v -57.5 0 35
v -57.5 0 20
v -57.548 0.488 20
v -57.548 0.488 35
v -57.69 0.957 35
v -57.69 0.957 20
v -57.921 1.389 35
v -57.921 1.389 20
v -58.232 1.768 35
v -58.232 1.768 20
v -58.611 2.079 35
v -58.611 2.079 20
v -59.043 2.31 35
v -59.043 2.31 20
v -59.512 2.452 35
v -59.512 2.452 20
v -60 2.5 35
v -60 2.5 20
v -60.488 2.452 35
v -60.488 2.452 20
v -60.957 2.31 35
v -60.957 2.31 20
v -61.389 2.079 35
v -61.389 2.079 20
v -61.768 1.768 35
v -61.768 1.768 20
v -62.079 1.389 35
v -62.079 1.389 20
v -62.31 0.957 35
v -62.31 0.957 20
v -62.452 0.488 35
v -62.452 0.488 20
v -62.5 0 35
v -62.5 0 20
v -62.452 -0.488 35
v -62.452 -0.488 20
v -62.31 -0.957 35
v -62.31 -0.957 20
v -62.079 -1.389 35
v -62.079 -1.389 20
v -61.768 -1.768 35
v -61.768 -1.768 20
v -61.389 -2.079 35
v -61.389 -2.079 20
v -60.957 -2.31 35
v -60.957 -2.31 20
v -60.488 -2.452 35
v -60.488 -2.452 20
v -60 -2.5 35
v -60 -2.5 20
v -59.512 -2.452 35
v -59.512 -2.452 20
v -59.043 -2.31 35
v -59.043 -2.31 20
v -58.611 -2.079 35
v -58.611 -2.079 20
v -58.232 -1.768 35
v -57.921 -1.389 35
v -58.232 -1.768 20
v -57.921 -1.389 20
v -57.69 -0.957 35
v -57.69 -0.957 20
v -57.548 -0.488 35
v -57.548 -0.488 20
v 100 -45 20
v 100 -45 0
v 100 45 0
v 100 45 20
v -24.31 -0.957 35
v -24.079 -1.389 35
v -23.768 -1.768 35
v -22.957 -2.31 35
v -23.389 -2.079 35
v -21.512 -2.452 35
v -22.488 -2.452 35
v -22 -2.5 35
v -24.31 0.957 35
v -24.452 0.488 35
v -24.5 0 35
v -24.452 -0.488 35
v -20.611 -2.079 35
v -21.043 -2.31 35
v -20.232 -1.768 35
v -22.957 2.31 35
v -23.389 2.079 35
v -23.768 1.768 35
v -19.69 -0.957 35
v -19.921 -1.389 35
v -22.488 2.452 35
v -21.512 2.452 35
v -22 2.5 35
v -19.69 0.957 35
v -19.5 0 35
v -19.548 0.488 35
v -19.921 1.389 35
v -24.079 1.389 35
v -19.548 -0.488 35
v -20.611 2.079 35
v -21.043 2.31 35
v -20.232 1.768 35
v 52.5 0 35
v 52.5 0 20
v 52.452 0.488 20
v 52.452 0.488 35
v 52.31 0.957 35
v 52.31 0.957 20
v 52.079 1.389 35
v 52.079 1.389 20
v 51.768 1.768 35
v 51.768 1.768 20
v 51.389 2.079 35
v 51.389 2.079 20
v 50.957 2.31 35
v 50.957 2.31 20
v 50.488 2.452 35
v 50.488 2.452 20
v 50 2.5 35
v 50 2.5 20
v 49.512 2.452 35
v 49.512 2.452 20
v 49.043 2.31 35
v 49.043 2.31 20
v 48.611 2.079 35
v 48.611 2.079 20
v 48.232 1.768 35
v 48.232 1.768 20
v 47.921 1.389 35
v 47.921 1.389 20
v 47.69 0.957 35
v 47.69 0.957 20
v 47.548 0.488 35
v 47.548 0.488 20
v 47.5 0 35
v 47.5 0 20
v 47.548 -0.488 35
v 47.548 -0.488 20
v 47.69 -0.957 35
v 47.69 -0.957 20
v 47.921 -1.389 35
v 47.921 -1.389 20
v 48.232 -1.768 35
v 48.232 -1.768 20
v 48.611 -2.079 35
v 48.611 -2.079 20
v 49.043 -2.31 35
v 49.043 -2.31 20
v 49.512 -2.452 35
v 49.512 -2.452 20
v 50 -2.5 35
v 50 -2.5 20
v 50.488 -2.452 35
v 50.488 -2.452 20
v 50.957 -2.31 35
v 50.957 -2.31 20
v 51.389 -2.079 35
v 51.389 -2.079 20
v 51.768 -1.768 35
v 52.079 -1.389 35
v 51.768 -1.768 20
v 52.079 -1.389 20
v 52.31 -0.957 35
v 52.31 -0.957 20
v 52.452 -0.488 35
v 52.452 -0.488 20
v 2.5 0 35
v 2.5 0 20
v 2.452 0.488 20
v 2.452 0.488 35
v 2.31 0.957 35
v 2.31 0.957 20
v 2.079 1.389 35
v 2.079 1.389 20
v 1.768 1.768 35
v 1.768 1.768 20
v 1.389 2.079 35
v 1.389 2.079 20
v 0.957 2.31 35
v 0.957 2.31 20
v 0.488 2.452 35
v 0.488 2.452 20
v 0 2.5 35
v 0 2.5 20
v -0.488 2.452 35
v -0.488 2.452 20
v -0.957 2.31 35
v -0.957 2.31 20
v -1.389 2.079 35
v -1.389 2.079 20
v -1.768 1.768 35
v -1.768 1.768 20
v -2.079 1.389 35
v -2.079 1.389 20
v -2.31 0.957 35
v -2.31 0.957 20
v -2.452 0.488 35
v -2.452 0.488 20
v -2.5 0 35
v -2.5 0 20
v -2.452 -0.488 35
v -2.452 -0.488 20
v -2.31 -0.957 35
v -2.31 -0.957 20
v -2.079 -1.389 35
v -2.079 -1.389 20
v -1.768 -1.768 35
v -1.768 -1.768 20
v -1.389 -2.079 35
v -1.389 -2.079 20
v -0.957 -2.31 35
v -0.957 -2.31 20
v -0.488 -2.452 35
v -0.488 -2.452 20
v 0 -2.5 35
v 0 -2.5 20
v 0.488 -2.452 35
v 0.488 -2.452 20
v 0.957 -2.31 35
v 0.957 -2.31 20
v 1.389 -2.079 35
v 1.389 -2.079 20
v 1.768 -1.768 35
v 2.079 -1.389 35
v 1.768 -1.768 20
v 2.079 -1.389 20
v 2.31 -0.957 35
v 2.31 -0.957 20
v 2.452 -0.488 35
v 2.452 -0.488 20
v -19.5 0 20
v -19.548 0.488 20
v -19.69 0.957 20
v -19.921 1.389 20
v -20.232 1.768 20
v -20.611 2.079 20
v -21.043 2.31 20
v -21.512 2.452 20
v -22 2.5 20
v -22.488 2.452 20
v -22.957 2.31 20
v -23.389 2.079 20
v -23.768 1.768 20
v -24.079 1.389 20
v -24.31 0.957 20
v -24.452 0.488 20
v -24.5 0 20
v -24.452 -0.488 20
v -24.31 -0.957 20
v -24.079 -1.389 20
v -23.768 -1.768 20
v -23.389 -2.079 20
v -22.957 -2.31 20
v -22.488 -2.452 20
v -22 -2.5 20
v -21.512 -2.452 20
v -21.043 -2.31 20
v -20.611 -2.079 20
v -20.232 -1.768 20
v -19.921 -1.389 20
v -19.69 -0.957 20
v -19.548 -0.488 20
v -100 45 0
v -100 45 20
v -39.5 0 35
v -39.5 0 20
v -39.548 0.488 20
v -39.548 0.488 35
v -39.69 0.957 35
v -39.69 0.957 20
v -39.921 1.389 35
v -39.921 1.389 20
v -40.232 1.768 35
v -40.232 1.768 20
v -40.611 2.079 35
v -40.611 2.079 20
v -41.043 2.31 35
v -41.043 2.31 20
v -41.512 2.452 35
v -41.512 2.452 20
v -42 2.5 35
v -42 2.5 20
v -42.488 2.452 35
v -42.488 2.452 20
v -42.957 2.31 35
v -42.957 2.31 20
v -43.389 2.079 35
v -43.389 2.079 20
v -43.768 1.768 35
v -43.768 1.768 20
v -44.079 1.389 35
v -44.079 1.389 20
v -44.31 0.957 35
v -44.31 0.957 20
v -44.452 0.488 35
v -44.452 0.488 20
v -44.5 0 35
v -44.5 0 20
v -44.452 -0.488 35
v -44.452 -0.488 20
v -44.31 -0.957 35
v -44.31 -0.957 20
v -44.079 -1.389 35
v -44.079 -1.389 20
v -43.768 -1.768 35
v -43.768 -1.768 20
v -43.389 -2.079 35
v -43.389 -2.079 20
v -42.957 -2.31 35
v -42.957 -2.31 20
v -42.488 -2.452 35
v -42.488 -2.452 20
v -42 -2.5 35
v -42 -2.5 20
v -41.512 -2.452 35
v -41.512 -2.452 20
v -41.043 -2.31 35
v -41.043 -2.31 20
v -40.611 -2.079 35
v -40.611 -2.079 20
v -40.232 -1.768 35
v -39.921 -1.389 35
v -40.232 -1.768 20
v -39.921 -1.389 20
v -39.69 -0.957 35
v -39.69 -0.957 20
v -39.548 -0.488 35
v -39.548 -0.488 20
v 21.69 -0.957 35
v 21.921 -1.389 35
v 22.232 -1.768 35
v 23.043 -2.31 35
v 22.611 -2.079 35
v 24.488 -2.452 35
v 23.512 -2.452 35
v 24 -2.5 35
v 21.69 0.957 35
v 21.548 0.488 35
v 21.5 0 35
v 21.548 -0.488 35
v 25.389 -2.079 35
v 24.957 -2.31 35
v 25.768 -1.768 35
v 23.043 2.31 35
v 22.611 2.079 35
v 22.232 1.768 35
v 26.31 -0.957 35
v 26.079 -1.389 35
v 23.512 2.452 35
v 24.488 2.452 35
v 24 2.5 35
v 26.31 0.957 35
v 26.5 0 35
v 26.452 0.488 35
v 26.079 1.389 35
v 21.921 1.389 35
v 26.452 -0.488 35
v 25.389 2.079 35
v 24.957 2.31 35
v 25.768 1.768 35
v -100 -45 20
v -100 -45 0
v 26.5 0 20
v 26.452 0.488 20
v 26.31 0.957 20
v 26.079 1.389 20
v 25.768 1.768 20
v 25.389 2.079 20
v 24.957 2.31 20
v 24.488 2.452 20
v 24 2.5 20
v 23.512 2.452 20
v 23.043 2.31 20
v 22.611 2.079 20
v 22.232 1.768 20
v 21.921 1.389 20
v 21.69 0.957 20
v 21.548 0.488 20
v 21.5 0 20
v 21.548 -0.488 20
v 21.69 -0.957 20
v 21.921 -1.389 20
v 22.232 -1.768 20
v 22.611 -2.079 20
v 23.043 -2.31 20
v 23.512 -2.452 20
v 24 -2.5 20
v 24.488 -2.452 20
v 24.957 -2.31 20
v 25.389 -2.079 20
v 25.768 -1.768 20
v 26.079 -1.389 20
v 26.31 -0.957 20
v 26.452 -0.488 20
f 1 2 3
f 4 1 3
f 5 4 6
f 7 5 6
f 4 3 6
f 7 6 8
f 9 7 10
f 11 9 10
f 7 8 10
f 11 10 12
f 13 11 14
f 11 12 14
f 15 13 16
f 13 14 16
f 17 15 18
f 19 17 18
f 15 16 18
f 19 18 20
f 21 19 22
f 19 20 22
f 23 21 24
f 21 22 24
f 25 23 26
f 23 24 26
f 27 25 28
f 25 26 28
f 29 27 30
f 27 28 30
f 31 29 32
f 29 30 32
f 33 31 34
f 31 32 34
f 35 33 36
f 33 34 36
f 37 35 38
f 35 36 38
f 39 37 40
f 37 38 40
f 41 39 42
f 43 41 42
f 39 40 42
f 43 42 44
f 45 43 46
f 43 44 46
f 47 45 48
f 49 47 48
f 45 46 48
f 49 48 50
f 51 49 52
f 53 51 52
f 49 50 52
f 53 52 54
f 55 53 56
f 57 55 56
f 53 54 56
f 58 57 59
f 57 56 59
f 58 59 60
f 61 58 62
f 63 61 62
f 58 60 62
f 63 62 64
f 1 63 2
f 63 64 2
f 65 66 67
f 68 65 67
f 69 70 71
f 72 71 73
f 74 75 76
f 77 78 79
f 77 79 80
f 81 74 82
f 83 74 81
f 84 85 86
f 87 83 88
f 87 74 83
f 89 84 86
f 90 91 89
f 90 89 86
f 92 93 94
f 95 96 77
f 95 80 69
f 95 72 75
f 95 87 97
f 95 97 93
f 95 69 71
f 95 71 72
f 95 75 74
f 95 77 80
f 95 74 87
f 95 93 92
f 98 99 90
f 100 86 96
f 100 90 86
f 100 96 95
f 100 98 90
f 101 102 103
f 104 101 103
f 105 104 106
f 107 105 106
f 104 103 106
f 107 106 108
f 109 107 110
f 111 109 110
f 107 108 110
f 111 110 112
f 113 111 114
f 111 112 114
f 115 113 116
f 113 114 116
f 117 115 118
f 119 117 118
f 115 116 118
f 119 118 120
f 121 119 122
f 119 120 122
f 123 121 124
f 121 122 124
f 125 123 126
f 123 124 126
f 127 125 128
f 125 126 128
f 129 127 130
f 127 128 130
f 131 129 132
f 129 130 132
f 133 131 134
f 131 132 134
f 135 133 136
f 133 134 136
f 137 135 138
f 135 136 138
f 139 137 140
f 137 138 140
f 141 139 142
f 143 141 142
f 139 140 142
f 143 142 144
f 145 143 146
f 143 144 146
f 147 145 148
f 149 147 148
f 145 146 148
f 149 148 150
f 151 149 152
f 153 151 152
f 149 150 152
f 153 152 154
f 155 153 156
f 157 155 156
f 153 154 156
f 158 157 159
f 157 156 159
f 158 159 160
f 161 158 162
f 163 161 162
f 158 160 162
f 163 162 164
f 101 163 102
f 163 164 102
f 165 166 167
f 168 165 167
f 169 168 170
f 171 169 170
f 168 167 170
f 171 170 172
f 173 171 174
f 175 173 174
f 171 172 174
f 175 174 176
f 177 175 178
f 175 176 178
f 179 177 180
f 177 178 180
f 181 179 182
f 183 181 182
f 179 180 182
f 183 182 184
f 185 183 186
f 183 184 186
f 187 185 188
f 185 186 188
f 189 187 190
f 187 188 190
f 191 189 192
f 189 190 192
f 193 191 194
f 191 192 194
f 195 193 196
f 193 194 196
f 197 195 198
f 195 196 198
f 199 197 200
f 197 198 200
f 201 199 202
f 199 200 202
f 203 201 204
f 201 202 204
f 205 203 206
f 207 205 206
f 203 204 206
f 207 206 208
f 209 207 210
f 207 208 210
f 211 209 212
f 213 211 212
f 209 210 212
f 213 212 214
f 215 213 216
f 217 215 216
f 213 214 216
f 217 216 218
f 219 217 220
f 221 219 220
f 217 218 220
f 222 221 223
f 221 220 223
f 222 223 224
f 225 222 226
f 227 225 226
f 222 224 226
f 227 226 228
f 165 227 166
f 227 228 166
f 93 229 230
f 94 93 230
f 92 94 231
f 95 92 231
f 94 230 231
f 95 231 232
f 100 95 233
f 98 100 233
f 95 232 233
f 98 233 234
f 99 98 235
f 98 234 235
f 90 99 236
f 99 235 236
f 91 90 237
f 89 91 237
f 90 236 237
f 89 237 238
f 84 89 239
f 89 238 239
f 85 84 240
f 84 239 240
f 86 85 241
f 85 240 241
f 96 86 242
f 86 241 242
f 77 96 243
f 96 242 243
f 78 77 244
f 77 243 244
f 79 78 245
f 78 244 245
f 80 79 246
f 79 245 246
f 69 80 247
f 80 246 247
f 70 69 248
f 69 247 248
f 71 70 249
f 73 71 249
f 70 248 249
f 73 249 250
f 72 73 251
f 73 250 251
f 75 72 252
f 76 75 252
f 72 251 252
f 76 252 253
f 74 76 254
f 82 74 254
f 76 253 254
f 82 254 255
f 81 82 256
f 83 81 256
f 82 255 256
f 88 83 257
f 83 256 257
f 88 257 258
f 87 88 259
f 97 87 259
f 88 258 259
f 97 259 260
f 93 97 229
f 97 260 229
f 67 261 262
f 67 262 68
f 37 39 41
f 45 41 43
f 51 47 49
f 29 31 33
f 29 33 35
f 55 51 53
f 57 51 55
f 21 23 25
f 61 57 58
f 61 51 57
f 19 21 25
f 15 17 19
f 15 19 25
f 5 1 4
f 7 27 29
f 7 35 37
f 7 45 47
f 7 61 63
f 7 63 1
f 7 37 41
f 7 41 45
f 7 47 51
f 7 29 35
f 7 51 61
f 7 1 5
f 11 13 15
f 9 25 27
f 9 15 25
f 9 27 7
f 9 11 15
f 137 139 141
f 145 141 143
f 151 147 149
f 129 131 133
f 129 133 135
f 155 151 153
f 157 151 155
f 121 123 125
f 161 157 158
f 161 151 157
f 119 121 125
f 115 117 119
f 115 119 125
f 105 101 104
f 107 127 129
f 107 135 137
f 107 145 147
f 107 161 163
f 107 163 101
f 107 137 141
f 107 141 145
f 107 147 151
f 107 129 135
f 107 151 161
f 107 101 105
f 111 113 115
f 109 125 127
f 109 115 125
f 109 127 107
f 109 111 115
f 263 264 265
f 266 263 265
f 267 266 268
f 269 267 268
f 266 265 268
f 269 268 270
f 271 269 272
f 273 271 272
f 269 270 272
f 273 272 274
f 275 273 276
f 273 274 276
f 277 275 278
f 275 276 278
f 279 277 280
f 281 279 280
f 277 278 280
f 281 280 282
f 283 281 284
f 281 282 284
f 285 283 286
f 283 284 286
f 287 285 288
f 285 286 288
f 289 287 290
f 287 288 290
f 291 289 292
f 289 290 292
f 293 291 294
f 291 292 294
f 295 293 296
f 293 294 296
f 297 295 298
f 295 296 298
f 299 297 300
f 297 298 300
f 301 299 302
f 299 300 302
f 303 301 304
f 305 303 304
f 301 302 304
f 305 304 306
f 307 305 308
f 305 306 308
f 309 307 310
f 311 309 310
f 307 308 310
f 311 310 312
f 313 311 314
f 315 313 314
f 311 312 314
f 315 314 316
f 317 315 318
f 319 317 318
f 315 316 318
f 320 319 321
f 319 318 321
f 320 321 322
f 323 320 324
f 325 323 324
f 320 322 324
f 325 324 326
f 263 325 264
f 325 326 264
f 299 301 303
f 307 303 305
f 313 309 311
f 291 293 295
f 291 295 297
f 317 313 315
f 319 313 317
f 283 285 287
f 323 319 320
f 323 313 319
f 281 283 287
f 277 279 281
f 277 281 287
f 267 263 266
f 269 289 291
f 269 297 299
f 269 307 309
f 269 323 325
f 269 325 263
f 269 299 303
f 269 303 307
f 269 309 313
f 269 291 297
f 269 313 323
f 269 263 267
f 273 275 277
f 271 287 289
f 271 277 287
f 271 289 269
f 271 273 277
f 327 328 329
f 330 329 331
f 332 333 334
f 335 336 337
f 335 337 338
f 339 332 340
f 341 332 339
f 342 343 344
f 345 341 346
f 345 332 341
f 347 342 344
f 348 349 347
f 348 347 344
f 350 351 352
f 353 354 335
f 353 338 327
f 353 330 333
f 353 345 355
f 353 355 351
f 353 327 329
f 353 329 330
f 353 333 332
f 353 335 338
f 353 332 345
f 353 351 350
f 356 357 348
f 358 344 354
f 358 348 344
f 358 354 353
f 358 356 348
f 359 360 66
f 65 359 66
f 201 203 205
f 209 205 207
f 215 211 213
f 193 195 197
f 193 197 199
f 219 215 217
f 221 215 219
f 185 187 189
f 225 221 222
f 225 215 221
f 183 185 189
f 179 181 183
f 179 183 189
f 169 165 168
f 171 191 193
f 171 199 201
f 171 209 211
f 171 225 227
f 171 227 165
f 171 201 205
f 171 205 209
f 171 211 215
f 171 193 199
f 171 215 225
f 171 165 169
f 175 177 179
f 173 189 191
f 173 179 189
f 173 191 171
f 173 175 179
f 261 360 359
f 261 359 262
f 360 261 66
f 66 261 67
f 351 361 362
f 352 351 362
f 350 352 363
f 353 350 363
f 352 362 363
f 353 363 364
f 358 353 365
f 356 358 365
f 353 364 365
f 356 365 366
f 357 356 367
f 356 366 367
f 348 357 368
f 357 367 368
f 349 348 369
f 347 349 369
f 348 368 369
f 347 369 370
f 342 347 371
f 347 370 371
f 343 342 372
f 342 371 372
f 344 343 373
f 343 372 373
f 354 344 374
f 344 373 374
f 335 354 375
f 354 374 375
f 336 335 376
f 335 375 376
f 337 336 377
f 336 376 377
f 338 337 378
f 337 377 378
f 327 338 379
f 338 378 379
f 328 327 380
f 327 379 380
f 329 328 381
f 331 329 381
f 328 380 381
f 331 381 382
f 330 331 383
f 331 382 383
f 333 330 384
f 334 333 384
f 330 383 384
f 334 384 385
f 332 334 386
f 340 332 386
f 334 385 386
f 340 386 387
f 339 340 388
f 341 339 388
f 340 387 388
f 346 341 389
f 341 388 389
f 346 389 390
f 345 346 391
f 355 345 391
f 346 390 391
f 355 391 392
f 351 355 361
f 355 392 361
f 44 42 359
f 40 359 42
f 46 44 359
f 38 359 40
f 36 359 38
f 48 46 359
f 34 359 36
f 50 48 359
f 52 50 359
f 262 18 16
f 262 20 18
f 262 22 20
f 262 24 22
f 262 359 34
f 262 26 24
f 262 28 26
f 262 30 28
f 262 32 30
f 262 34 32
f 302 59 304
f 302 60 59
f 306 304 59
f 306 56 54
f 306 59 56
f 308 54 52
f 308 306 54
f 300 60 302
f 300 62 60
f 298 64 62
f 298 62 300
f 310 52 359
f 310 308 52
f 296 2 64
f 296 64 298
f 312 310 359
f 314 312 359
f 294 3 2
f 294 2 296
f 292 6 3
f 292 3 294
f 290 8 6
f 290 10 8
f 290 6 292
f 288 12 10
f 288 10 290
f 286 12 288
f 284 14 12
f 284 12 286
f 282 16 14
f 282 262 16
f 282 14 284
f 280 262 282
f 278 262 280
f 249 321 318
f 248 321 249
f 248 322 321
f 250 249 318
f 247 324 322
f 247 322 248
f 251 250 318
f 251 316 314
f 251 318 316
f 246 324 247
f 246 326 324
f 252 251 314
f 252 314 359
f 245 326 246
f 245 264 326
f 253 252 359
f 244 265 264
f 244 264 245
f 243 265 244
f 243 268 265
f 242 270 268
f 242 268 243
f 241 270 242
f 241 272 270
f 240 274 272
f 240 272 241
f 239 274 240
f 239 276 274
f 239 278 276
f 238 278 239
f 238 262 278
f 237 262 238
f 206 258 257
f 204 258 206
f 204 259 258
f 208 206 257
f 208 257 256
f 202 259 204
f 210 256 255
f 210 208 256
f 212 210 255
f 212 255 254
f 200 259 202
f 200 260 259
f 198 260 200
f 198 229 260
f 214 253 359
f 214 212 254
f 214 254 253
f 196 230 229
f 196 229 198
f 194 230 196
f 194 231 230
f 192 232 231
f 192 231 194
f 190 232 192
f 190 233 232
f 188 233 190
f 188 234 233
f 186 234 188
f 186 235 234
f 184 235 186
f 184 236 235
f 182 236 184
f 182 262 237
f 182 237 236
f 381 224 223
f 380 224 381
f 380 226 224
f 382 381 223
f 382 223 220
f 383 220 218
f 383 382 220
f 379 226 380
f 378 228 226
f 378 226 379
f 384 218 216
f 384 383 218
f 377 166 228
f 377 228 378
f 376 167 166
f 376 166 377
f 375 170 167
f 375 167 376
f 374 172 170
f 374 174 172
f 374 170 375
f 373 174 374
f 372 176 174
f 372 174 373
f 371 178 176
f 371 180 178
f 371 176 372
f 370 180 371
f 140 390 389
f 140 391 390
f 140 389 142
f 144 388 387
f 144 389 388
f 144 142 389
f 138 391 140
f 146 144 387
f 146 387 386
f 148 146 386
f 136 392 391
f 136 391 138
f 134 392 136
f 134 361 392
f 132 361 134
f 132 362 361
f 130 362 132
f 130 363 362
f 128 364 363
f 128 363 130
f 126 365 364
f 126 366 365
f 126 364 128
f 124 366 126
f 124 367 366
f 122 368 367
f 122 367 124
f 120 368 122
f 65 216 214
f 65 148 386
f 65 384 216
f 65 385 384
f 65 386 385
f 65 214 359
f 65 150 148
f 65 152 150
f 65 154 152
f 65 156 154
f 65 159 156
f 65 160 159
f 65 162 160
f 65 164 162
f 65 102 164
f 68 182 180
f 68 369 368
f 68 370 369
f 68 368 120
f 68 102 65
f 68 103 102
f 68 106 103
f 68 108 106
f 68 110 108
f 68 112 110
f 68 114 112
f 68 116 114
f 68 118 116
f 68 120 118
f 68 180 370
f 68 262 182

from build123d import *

# Parameters (mm, degrees)
F0_W     = 200
F0_H     = 90
F1_DEPTH = 20
F2_R     = 2.5
F3_DEPTH = 15


with BuildPart() as f1:
    # F0 (on Top) → F1 (new body)
    with BuildSketch(Plane.XY):
        Rectangle(F0_W, F0_H)
    extrude(amount=F1_DEPTH)

    # F2 (on face) → F3 (join)
    with BuildSketch(Plane.XY.offset(20)):
        with Locations((-60, 0)):
            Circle(F2_R)
        with Locations((-42, 0)):
            Circle(F2_R)
        with Locations((-22, 0)):
            Circle(F2_R)
        Circle(F2_R)
        with Locations((24, 0)):
            Circle(F2_R)
        with Locations((50, 0)):
            Circle(F2_R)
    extrude(amount=F3_DEPTH)


solid = f1.part
